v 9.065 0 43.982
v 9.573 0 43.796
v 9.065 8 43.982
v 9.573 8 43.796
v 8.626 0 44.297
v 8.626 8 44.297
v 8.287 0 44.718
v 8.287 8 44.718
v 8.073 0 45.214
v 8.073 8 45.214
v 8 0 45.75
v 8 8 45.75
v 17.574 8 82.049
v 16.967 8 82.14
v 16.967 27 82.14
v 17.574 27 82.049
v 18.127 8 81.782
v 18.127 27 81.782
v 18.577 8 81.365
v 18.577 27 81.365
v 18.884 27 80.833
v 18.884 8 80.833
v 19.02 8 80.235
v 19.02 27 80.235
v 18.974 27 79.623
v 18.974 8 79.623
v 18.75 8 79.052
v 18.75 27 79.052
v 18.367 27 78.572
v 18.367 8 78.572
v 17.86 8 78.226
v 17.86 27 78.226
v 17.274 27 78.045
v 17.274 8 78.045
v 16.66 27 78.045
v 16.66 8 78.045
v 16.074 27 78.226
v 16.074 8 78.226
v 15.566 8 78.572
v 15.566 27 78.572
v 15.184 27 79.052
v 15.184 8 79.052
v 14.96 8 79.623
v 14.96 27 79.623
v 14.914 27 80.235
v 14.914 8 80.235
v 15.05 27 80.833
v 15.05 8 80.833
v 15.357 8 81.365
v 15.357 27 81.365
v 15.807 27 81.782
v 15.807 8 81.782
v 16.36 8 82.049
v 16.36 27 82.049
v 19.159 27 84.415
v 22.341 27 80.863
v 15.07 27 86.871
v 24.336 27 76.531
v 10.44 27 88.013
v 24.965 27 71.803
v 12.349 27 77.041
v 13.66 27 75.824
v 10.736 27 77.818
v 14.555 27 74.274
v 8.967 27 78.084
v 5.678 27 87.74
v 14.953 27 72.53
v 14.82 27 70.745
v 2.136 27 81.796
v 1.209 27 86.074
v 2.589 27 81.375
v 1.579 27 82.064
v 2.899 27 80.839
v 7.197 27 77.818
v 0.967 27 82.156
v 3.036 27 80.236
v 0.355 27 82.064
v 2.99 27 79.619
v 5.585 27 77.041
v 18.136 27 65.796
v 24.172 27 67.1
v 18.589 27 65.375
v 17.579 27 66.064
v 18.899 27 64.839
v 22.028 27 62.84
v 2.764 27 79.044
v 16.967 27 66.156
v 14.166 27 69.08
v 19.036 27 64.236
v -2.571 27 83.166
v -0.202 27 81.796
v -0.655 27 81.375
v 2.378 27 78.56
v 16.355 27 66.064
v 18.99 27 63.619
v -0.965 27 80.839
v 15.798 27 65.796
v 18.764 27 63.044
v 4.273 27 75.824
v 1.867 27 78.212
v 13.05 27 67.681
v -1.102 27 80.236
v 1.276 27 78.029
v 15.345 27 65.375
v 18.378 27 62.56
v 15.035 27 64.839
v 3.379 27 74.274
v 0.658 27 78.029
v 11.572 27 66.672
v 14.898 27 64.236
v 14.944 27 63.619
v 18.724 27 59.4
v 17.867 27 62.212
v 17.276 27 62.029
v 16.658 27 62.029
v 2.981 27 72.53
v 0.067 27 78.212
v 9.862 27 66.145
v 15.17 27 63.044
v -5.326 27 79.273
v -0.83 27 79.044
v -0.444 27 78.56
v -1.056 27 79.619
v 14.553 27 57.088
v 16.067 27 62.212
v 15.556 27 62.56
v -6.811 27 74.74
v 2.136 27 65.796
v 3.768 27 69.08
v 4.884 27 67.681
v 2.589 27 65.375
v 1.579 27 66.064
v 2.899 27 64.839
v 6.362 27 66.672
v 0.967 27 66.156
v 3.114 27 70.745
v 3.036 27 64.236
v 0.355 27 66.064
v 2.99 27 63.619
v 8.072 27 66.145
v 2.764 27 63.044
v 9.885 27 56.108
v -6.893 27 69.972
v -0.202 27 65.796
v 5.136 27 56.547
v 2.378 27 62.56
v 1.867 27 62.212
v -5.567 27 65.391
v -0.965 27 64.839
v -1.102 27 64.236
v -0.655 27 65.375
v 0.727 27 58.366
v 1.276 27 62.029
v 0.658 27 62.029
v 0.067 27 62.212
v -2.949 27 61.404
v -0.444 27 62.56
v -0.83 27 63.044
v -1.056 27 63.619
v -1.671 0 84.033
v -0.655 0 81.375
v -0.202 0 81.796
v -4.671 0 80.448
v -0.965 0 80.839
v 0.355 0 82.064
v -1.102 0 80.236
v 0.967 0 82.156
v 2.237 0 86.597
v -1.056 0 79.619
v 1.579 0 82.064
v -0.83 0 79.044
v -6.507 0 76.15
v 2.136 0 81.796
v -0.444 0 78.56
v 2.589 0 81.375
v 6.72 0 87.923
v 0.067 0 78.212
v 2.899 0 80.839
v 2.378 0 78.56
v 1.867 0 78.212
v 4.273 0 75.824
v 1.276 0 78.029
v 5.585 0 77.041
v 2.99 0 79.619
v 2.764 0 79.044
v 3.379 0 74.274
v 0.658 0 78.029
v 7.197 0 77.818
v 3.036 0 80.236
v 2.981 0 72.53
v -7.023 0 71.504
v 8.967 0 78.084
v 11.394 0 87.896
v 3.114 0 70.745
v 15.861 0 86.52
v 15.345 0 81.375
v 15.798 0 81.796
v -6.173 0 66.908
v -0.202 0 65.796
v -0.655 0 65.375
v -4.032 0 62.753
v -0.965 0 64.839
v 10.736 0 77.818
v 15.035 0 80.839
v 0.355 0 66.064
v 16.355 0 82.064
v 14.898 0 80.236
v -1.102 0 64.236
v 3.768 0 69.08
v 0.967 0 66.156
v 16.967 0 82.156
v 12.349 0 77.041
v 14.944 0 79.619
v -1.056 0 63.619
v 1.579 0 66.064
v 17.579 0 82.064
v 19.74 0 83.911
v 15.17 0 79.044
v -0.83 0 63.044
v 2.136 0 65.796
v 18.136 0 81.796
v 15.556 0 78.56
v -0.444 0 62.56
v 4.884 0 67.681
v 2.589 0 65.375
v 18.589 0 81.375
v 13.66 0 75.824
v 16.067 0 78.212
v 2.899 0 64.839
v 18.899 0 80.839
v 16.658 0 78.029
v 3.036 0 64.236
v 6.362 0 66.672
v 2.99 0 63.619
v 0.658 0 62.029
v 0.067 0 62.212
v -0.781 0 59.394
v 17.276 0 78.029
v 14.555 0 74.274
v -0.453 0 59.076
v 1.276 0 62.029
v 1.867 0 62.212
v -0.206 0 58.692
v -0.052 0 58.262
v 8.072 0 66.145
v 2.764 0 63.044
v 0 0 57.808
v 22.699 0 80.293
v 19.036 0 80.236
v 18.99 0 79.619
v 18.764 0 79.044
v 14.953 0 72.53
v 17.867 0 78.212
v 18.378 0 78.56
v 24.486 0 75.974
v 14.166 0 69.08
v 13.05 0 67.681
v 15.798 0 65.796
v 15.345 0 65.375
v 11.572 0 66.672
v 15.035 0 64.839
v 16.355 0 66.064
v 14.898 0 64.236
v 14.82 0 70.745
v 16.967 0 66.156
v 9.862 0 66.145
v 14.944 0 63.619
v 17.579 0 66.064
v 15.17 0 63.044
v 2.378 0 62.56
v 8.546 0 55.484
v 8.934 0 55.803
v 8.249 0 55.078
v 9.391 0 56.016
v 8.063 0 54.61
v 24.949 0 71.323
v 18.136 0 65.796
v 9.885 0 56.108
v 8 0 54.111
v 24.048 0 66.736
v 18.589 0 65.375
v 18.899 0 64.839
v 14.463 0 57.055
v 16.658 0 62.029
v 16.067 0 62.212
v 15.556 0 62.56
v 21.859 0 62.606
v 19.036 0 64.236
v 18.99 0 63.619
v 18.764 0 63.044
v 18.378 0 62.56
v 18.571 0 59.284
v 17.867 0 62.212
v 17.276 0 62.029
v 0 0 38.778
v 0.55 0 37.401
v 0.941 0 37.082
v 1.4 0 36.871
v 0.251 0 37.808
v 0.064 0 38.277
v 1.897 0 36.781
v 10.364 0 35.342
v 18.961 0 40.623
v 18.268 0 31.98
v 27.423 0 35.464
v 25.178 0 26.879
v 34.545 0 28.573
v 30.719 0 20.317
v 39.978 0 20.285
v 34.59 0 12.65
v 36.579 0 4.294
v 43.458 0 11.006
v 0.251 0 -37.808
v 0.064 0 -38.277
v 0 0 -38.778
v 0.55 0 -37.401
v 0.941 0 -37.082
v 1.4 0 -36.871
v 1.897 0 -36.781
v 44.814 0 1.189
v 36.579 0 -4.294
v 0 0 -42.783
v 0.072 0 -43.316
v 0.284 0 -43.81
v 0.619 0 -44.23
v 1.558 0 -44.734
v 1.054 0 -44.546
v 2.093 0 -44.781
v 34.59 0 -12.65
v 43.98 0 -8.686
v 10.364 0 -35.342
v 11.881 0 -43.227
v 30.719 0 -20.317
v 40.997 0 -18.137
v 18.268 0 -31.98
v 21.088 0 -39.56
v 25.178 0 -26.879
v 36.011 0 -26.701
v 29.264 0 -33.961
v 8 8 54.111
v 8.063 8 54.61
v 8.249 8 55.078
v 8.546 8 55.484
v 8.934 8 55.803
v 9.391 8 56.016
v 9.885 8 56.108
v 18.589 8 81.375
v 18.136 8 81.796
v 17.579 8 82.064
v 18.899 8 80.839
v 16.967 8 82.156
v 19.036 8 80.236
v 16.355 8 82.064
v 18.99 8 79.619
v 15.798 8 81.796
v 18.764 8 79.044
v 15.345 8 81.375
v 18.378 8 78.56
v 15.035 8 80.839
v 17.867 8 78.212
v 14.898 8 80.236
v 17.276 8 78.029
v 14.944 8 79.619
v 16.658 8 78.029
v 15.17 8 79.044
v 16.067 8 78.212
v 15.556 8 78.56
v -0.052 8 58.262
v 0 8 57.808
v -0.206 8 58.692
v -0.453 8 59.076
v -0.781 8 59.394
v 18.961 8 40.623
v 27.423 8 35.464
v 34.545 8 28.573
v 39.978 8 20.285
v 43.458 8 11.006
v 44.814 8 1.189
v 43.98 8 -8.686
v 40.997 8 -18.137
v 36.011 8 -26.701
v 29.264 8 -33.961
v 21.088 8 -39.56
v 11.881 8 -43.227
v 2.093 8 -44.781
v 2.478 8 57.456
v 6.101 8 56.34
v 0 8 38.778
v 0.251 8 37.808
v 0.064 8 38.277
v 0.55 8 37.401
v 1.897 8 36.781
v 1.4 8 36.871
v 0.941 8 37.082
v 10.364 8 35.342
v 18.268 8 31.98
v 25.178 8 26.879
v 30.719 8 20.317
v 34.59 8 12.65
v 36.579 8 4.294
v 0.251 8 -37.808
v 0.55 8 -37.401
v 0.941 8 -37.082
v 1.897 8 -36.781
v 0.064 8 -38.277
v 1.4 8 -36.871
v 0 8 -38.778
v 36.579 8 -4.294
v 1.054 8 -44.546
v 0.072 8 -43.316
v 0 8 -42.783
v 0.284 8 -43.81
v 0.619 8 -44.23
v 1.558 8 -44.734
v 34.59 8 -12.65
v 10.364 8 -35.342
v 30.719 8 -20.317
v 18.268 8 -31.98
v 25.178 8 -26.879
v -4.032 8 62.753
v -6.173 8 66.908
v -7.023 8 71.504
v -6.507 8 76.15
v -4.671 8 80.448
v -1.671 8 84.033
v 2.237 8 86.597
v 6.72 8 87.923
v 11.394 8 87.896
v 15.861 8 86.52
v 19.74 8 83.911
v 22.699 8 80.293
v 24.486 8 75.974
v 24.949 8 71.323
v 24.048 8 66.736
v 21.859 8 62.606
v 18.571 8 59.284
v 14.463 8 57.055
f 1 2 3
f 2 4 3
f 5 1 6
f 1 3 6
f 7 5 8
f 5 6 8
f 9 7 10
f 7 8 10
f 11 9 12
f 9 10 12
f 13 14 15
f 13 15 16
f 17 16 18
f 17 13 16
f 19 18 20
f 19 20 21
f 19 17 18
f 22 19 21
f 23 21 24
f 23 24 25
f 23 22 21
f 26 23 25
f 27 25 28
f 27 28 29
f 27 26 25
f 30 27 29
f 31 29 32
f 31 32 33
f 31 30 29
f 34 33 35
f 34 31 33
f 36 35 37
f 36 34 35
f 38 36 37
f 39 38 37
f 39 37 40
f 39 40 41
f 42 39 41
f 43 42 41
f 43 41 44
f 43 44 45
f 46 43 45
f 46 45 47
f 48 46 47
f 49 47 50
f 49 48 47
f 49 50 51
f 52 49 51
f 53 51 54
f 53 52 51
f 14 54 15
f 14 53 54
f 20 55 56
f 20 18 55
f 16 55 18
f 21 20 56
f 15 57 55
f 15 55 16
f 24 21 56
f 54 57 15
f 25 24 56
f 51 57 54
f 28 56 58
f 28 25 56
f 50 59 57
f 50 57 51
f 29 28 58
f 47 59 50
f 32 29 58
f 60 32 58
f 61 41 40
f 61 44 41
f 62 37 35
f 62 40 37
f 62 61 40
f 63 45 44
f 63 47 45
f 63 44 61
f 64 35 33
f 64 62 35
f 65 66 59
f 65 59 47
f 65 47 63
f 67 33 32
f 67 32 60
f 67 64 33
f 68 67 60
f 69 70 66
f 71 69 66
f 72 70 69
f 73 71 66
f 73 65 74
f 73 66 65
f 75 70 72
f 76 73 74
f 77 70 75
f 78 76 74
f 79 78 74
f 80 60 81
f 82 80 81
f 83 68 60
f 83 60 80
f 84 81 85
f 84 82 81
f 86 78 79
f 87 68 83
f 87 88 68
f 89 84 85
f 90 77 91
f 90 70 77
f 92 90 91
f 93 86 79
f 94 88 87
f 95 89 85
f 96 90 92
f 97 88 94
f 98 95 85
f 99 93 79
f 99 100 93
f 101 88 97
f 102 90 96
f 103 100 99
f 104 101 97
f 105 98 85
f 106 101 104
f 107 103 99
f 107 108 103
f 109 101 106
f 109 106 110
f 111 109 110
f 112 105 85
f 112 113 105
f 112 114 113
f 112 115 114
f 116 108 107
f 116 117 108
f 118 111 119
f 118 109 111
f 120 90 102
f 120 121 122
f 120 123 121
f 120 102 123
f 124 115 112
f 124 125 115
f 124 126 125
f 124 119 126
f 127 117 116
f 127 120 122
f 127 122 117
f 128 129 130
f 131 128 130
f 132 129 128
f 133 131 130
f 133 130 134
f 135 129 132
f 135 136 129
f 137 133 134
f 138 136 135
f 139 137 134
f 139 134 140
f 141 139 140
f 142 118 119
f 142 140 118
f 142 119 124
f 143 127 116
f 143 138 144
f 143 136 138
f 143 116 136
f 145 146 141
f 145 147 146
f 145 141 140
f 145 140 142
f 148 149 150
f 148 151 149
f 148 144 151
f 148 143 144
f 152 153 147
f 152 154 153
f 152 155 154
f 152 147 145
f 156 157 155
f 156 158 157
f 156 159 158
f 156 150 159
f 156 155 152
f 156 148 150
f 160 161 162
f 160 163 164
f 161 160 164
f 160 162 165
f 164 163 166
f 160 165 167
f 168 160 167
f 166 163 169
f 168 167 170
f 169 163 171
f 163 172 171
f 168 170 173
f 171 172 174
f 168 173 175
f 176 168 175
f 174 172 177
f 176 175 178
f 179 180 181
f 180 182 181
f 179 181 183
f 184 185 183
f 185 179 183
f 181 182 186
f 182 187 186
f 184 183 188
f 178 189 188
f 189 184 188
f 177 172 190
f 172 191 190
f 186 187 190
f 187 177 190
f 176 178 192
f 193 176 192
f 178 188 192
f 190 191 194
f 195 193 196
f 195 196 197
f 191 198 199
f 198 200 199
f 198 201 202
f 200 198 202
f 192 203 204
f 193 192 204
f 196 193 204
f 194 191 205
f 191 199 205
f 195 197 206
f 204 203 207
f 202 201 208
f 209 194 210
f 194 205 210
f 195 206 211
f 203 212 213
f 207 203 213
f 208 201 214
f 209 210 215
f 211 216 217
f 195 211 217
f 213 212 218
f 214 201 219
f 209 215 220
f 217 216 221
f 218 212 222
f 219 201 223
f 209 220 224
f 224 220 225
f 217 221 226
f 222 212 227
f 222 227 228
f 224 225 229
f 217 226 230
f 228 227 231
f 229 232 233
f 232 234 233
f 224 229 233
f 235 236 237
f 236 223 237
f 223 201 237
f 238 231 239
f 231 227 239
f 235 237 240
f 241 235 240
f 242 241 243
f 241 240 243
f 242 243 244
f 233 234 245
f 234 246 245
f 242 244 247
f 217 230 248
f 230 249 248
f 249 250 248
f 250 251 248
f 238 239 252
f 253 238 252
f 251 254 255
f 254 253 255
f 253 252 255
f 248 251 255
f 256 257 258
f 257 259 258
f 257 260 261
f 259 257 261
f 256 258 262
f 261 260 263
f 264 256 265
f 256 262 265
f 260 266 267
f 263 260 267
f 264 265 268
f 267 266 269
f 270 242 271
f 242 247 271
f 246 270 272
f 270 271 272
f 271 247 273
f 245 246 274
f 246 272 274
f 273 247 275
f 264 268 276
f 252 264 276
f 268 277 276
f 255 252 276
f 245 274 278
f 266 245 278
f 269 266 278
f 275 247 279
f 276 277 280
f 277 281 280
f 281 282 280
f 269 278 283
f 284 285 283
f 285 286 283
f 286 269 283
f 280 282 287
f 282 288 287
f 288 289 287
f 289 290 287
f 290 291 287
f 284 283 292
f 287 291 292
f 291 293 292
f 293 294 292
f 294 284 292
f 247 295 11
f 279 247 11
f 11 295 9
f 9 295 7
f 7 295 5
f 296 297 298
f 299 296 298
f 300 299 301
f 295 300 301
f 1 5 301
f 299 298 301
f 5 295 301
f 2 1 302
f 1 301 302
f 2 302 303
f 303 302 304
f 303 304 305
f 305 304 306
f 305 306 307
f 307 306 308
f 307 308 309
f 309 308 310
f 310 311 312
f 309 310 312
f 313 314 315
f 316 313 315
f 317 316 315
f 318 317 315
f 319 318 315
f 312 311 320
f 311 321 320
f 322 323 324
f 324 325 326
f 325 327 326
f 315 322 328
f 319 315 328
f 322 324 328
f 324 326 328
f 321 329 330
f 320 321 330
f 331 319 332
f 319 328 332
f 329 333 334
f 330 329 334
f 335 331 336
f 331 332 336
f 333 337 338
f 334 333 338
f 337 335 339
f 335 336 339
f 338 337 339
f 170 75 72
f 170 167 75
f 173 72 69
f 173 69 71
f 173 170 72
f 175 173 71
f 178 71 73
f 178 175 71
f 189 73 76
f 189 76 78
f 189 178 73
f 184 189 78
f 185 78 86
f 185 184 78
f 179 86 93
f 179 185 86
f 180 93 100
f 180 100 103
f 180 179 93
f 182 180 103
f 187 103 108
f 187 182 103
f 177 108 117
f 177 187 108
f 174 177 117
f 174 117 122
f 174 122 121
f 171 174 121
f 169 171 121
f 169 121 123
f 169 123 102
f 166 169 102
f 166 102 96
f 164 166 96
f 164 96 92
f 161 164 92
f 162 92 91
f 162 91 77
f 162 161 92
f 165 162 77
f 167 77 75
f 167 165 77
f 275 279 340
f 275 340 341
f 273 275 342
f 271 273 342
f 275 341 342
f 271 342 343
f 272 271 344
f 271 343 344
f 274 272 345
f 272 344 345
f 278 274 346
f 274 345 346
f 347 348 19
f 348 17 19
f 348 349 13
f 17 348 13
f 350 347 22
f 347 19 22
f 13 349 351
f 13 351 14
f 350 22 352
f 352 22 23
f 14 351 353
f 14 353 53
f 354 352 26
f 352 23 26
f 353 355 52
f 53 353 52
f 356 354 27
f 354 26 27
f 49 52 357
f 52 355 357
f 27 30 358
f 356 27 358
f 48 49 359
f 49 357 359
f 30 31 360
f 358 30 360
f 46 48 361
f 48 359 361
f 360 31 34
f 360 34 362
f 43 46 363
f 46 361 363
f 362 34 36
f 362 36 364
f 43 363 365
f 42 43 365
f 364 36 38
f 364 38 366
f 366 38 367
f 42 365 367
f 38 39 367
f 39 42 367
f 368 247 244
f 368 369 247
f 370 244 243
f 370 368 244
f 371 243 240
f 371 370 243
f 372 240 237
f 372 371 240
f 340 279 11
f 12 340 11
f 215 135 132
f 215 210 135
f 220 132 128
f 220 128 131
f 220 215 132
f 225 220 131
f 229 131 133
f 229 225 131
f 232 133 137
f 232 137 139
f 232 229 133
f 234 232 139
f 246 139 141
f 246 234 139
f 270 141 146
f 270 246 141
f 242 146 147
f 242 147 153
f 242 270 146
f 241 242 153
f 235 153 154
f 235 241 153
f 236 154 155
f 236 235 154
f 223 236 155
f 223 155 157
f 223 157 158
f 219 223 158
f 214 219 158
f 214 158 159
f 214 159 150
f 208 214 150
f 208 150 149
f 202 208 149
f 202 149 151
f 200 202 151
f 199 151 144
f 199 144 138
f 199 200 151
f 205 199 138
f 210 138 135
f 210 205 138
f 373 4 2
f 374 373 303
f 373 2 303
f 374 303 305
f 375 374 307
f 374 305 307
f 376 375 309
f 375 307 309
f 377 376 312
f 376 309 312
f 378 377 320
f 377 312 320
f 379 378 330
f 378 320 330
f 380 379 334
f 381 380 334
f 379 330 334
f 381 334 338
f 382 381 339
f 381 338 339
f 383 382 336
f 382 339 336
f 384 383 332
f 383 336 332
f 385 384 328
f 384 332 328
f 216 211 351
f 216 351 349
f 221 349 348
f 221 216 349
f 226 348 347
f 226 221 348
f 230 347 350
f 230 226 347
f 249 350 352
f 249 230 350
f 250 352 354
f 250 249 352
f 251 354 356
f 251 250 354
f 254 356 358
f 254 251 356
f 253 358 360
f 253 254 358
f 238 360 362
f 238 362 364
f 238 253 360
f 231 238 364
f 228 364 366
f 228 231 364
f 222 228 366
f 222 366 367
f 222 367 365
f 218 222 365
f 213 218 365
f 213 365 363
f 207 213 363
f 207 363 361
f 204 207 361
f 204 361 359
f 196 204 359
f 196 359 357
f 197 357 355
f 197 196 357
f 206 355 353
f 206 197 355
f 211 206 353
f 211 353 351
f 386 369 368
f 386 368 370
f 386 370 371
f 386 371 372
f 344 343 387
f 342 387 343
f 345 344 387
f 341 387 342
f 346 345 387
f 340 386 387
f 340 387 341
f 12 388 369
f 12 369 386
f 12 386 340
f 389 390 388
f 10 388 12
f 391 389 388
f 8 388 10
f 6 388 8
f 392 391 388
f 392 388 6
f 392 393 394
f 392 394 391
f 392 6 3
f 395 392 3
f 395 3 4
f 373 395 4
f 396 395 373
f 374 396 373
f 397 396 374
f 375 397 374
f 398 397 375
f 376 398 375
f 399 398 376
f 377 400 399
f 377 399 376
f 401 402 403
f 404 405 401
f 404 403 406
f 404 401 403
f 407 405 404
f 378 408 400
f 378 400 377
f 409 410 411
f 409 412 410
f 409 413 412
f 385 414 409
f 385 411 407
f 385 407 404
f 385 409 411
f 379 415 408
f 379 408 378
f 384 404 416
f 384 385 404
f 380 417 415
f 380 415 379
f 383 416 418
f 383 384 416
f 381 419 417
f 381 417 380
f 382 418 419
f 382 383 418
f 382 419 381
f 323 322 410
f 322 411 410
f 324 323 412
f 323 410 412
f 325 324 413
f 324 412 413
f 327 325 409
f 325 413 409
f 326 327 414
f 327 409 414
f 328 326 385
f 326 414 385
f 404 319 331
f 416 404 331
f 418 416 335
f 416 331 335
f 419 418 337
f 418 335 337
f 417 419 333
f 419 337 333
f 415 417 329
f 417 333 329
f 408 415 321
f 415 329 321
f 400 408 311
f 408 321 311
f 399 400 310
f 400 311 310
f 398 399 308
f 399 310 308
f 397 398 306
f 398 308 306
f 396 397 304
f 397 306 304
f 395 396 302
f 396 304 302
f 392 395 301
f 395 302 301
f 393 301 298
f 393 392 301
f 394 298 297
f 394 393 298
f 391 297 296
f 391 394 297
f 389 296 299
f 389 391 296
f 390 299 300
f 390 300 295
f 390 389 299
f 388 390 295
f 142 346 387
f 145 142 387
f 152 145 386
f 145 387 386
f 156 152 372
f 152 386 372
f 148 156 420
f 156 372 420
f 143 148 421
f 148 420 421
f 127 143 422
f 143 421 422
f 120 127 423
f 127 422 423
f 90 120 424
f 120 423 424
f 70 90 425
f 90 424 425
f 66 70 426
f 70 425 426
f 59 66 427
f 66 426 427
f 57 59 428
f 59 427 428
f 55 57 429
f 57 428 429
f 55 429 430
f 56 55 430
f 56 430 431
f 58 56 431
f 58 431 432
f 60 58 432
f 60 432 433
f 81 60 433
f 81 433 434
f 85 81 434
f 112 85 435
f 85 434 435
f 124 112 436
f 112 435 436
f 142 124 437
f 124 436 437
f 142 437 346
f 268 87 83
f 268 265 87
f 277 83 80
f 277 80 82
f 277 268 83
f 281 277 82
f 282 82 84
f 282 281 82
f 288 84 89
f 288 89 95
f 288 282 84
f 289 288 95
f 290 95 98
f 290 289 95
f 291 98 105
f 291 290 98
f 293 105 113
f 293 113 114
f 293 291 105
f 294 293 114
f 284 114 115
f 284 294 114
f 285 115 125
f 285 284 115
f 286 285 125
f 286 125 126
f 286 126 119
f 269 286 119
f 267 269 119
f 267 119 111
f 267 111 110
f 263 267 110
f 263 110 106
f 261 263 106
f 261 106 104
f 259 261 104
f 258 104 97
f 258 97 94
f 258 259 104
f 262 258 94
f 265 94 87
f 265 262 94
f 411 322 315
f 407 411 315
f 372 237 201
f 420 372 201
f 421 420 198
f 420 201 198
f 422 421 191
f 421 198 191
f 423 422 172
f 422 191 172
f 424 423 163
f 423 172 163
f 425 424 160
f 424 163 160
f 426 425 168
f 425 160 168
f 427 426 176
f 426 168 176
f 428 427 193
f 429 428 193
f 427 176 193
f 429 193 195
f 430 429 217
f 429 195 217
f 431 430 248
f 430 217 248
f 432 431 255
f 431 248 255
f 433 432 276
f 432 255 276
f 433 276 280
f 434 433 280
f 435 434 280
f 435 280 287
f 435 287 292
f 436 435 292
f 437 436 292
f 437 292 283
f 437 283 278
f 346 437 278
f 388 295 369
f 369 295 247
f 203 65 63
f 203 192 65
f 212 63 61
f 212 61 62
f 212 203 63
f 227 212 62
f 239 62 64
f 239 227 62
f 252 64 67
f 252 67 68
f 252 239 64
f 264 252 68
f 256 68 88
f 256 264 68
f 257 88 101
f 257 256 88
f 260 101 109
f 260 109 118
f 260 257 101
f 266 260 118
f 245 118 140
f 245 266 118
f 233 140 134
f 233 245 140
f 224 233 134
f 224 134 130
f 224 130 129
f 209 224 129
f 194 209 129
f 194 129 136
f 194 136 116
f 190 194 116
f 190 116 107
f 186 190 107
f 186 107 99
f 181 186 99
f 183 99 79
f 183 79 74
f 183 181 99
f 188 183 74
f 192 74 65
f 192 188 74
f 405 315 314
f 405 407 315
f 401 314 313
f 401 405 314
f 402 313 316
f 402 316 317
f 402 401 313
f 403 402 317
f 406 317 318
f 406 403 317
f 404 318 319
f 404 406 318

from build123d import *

# Parameters (mm, degrees)
SKETCH1_R           = 2.075
SKETCH1_R_2         = 6.003208263
BOSS_EXTRUDE2_DEPTH = 8
FILLET1_R           = 2
SKETCH2_R           = 16
SKETCH2_R_2         = 2.075
SKETCH2_R_3         = 6.003208263
SKETCH2_R_4         = 2.059067384
BOSS_EXTRUDE3_DEPTH = 19


with BuildPart() as part:
    # Sketch1 → Boss-Extrude2 (new body)
    with BuildSketch(Plane(origin=(0, 0, 0), x_dir=(1, 0, 0), z_dir=(0, 1, 0))):
        with BuildLine():
            Line((0, 44.83), (0, 36.83))
            ThreePointArc((0, 36.83), (36.83, 0), (0, -36.83))
            Line((0, -36.83), (0, -46.83))
            Line((0, -46.83), (0, -58.83))
            ThreePointArc((0, -58.83), (14.116701064, -87.229775601), (8, -56.110417137))
            Line((8, -56.110417137), (8, -44.110417137))
            ThreePointArc((8, -44.110417137), (44.649741882, 4.016148637), (0, 44.83))
        make_face()
        with Locations(Location((0.96696537, -64.081170969, 0), (0, 0, 270))):
            Circle(SKETCH1_R, mode=Mode.SUBTRACT)
        with Locations(Location((16.96696537, -64.081170969, 0), (0, 0, 270))):
            Circle(SKETCH1_R, mode=Mode.SUBTRACT)
        with Locations(Location((16.96696537, -80.081170969, 0), (0, 0, 270))):
            Circle(SKETCH1_R, mode=Mode.SUBTRACT)
        with Locations(Location((0.96696537, -80.081170969, 0), (0, 0, 270))):
            Circle(SKETCH1_R, mode=Mode.SUBTRACT)
        with Locations(Location((8.96696537, -72.081170969, 0), (0, 0, 270))):
            Circle(SKETCH1_R_2, mode=Mode.SUBTRACT)
    extrude(amount=BOSS_EXTRUDE2_DEPTH)

    # Fillet1
    fillet1_edges = [part.edges().sort_by_distance(p)[0] for p in [
        (0, 4, 58.83),
        (0, 4, 36.83),
        (0, 4, -36.83),
        (0, 4, -44.83),
        (8, 4, 44.110417137),
        (8, 4, 56.110417137),
    ]]
    fillet(fillet1_edges, radius=FILLET1_R)

    # Sketch2 → Boss-Extrude3 (add)
    with BuildSketch(Plane(origin=(0, 8, 0), x_dir=(1, 0, 0), z_dir=(0, 1, 0))):
        with Locations(Location((8.96696537, -72.081170969, 0), (0, 0, 86.709940875))):
            Circle(SKETCH2_R)
        with Locations(Location((0.96696537, -64.081170969, 0), (0, 0, 270))):
            Circle(SKETCH2_R_2, mode=Mode.SUBTRACT)
        with Locations(Location((8.96696537, -72.081170969, 0), (0, 0, 270))):
            Circle(SKETCH2_R_3, mode=Mode.SUBTRACT)
        with Locations(Location((16.96696537, -64.081170969, 0), (0, 0, 270))):
            Circle(SKETCH2_R_2, mode=Mode.SUBTRACT)
        with Locations(Location((16.96696537, -80.081170969, 0), (0, 0, 270))):
            Circle(SKETCH2_R_4, mode=Mode.SUBTRACT)
        with Locations(Location((0.96696537, -80.081170969, 0), (0, 0, 270))):
            Circle(SKETCH2_R_2, mode=Mode.SUBTRACT)
    extrude(amount=BOSS_EXTRUDE3_DEPTH)


solid = part.part
